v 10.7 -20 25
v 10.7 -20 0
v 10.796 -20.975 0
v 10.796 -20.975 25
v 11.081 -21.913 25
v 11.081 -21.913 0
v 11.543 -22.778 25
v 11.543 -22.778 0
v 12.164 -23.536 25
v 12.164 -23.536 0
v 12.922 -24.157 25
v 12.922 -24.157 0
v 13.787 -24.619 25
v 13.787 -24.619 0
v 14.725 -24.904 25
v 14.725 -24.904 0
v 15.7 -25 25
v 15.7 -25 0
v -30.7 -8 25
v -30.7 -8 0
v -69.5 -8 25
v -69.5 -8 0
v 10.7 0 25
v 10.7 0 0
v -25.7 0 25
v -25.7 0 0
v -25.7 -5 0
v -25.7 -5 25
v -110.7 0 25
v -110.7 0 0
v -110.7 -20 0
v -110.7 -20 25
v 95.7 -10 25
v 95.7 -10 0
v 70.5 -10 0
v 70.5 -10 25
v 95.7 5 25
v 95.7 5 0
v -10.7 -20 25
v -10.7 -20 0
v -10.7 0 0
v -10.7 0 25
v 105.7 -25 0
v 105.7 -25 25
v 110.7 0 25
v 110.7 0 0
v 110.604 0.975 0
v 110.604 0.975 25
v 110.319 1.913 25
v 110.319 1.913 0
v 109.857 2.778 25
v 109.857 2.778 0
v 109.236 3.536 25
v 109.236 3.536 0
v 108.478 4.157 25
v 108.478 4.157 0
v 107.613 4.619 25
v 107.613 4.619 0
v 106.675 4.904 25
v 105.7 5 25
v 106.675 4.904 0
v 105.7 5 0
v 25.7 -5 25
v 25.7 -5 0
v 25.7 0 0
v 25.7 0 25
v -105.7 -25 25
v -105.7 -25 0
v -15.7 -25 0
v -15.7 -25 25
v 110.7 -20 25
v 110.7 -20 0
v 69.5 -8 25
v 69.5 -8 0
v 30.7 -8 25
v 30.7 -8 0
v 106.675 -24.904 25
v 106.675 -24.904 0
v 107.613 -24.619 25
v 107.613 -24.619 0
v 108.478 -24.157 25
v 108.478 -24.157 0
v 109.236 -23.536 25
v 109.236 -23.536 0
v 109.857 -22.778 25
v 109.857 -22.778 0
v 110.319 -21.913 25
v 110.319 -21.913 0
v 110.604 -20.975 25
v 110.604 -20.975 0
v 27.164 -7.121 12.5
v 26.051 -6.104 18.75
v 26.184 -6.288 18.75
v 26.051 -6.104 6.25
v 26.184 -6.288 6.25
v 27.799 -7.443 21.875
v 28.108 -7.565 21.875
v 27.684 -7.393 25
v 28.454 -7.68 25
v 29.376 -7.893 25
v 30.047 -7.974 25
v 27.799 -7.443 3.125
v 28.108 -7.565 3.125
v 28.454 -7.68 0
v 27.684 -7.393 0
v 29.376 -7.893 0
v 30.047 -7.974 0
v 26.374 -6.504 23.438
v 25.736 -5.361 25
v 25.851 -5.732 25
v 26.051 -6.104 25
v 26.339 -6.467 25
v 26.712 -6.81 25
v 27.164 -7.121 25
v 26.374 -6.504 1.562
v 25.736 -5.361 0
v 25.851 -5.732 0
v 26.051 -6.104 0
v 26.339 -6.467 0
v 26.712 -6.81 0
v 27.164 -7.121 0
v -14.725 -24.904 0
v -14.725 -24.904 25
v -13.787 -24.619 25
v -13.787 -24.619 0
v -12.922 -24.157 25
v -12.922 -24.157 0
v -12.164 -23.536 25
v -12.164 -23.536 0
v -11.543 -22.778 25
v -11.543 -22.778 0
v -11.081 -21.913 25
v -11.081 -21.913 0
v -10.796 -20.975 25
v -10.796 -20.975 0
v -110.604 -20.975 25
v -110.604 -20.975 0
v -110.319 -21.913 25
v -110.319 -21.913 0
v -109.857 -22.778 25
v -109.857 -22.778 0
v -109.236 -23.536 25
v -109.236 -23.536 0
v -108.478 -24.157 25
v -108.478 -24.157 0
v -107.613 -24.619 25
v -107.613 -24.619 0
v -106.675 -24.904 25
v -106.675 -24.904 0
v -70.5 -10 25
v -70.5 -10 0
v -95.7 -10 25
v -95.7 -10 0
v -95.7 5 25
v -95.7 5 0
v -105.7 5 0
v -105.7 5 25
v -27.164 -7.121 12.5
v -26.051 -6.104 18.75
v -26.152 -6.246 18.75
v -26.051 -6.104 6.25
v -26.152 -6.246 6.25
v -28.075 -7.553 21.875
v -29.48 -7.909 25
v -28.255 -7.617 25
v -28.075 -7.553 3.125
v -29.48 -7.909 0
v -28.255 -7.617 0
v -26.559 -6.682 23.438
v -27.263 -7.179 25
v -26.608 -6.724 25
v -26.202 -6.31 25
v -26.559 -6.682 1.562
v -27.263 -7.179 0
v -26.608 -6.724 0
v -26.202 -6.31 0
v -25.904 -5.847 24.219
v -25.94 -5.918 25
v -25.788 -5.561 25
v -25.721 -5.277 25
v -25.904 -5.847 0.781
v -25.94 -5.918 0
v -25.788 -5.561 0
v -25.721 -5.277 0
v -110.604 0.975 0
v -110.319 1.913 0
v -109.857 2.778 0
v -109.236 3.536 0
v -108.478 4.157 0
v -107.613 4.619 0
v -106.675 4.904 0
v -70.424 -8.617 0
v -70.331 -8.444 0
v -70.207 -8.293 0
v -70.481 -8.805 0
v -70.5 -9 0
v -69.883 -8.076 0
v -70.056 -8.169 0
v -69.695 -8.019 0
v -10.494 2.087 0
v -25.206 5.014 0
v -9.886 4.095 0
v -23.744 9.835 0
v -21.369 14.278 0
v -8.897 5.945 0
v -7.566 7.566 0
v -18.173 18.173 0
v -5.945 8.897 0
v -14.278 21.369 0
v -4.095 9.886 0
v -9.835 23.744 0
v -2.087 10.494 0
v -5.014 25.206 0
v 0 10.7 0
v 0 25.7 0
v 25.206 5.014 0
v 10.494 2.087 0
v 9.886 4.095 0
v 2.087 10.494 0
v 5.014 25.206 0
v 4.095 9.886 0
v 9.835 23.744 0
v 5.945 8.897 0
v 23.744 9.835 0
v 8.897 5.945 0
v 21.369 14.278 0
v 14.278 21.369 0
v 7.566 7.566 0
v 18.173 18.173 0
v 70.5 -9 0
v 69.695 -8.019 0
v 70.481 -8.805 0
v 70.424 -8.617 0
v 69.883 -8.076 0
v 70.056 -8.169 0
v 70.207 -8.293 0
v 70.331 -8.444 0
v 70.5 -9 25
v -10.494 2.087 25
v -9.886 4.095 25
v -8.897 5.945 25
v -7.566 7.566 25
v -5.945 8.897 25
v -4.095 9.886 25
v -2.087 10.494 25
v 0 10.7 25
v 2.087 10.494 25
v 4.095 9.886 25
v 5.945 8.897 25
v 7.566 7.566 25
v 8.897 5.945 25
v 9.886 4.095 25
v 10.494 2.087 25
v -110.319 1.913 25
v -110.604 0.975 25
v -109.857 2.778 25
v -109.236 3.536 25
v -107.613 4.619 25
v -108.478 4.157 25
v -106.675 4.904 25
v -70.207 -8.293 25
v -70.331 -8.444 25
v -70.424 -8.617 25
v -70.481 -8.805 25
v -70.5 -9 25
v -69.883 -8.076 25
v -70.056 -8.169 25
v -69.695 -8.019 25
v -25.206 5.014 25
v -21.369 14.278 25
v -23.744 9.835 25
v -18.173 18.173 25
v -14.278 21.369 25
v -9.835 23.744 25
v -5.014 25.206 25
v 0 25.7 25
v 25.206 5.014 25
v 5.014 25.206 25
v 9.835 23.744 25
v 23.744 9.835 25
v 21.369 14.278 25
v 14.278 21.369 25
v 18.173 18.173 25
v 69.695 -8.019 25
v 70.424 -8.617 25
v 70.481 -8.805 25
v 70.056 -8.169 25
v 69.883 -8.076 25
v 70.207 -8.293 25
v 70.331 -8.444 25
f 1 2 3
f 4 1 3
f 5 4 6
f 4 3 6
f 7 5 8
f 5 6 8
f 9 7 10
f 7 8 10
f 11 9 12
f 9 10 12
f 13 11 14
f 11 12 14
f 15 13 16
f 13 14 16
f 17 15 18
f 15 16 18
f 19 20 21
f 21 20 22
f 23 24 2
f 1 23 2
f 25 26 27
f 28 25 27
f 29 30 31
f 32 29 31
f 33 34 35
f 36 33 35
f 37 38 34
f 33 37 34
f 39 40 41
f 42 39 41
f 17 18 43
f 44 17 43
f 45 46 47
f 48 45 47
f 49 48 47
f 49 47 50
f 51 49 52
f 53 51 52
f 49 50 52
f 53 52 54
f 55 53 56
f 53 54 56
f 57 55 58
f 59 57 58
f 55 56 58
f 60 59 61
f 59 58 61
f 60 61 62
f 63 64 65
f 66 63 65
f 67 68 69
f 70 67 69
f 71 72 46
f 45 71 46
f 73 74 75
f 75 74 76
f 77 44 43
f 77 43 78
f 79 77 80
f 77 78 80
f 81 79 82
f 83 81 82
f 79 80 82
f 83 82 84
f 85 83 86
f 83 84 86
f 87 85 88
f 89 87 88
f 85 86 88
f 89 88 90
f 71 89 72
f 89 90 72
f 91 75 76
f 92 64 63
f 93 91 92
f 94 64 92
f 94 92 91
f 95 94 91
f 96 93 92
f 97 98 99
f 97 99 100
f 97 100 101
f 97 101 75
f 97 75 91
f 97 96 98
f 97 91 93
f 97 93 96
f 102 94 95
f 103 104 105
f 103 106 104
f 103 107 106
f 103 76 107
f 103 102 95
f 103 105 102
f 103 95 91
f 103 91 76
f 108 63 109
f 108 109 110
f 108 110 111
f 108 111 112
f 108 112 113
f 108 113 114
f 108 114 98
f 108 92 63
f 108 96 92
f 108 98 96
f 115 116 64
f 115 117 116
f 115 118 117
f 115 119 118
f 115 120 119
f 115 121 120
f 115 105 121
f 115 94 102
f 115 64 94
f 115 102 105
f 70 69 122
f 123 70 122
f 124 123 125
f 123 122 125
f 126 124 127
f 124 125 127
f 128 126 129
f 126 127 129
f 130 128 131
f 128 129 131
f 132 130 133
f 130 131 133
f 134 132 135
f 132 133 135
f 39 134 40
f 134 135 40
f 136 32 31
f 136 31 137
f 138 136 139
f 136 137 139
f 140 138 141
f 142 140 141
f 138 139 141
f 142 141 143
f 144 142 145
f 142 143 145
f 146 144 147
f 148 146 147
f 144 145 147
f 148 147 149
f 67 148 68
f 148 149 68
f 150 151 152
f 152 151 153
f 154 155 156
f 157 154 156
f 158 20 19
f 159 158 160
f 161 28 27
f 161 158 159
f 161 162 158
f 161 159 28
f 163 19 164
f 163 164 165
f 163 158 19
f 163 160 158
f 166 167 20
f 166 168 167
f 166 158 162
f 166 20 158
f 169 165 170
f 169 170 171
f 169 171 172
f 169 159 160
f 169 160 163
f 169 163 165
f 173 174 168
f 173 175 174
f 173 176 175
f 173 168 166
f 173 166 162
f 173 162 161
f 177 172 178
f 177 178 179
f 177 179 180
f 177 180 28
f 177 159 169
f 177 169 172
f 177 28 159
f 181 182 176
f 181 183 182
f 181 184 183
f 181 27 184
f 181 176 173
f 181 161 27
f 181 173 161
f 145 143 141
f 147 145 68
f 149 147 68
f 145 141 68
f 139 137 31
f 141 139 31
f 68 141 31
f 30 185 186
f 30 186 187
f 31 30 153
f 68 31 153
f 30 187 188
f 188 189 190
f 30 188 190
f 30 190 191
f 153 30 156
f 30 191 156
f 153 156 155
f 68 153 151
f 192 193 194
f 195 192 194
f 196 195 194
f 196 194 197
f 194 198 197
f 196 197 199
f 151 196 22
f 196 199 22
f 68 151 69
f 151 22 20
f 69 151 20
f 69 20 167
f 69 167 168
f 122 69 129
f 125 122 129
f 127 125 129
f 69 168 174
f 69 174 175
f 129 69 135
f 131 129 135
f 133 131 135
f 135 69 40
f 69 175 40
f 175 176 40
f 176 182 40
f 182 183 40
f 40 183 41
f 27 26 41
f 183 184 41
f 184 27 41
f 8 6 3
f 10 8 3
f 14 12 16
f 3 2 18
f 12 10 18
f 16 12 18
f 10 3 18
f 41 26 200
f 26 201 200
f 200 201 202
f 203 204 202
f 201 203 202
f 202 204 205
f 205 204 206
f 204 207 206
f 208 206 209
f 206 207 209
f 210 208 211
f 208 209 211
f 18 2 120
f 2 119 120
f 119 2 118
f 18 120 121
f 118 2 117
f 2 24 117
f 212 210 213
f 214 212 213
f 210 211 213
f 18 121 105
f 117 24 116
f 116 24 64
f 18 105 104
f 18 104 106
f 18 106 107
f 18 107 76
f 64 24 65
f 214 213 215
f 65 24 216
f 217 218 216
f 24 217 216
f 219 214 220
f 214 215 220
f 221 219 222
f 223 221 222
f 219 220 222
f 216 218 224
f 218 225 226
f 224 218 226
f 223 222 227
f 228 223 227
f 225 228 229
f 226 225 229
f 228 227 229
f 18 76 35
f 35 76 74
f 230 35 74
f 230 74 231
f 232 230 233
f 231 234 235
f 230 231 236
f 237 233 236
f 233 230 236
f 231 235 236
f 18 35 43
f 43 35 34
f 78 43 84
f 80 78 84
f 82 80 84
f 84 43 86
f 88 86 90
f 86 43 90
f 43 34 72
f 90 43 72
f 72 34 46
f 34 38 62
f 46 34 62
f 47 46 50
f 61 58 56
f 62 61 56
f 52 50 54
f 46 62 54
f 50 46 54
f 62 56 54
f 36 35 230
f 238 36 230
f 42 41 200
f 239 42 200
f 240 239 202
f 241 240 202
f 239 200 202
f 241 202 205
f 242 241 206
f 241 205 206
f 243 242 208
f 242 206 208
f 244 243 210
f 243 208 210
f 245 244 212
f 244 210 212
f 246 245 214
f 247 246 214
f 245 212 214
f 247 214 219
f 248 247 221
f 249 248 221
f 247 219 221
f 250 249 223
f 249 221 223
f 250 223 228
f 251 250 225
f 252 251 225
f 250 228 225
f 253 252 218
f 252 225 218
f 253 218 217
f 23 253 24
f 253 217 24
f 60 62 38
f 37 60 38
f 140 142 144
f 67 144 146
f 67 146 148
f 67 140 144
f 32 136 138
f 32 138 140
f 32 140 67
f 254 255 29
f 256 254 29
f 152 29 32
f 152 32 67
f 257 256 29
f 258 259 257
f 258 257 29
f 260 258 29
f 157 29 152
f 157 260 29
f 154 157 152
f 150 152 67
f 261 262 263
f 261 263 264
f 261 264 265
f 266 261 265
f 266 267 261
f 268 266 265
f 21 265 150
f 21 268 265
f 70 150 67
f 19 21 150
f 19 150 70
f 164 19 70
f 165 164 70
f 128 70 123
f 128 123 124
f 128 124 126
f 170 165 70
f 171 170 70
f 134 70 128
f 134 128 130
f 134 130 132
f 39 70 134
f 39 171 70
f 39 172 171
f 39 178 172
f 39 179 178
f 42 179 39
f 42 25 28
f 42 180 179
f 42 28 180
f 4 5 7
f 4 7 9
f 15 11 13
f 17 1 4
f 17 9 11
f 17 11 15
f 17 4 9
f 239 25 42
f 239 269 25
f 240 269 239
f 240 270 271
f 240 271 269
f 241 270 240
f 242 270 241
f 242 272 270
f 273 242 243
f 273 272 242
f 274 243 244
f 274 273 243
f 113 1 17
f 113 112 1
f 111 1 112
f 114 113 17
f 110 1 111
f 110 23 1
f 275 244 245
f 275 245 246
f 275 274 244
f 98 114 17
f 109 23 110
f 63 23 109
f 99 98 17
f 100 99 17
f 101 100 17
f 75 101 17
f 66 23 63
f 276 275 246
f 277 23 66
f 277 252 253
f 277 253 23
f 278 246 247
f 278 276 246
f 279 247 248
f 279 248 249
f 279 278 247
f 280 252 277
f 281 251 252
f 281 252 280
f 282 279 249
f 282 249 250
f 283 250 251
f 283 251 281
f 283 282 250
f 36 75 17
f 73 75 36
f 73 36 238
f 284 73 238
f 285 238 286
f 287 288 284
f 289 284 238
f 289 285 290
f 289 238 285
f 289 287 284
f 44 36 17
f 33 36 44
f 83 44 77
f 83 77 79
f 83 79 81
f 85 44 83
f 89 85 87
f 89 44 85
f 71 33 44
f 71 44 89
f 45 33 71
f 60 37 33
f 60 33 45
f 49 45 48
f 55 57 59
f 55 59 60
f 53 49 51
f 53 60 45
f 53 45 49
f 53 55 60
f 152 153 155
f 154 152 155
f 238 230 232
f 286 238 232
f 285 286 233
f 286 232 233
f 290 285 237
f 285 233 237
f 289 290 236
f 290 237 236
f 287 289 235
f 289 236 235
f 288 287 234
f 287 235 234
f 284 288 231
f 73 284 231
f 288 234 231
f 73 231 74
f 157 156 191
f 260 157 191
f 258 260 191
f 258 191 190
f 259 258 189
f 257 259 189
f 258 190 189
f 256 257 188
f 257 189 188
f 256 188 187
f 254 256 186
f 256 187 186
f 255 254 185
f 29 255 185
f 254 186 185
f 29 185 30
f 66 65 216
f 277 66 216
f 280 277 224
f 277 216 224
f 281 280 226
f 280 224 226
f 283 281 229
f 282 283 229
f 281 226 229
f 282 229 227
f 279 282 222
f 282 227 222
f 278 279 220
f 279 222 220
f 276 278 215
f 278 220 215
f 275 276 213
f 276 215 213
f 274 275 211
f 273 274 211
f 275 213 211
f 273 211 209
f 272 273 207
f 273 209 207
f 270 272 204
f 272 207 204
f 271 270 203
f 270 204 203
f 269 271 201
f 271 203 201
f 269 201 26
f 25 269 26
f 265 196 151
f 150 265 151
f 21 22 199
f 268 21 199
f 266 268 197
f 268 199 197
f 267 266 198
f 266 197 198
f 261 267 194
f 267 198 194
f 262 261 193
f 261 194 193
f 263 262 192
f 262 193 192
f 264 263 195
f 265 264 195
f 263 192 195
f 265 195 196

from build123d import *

# Parameters (mm, degrees)
F1_DEPTH = 25


with BuildPart() as f1:
    # F0 (on Top) → F1 (new body)
    with BuildSketch(Plane.XY):
        with BuildLine():
            ThreePointArc((-10.7, 0), (0, 10.7), (10.7, 0))
            Line((10.7, 0), (10.7, -20))
            ThreePointArc((10.7, -20), (12.1644660941, -23.5355339059), (15.7, -25))
            Line((15.7, -25), (105.7, -25))
            ThreePointArc((105.7, -25), (109.2355339059, -23.5355339059), (110.7, -20))
            Line((110.7, -20), (110.7, -10))
            Line((110.7, -10), (110.7, 0))
            ThreePointArc((110.7, 0), (109.2355339059, 3.5355339059), (105.7, 5))
            Line((105.7, 5), (95.7, 5))
            Line((95.7, 5), (95.7, -10))
            Line((95.7, -10), (70.5, -10))
            Line((70.5, -10), (70.5, -9))
            ThreePointArc((70.5, -9), (70.2071067812, -8.2928932188), (69.5, -8))
            Line((69.5, -8), (30.7, -8))
            add(Edge.make_bspline(
                [(25.7, -5), (25.7, -8), (30.7, -8)],
                knots=[0, 0, 0, 1.5707963268, 1.5707963268, 1.5707963268], degree=2, weights=[1, 0.7071067812, 1]))
            Line((25.7, -5), (25.7, 0))
            ThreePointArc((25.7, 0), (0, 25.7), (-25.7, 0))
            Line((-25.7, 0), (-25.7, -5))
            add(Edge.make_bspline(
                [(-30.7, -8), (-25.7, -8), (-25.7, -5)],
                knots=[4.7123889804, 4.7123889804, 4.7123889804, 6.2831853072, 6.2831853072, 6.2831853072], degree=2, weights=[1, 0.7071067812, 1]))
            Line((-30.7, -8), (-69.5, -8))
            ThreePointArc((-69.5, -8), (-70.2071067812, -8.2928932188), (-70.5, -9))
            Line((-70.5, -9), (-70.5, -10))
            Line((-70.5, -10), (-95.7, -10))
            Line((-95.7, -10), (-95.7, 5))
            Line((-95.7, 5), (-105.7, 5))
            ThreePointArc((-105.7, 5), (-109.2355339059, 3.5355339059), (-110.7, 0))
            Line((-110.7, 0), (-110.7, -10))
            Line((-110.7, -10), (-110.7, -20))
            ThreePointArc((-110.7, -20), (-109.2355339059, -23.5355339059), (-105.7, -25))
            Line((-105.7, -25), (-15.7, -25))
            ThreePointArc((-15.7, -25), (-12.1644660941, -23.5355339059), (-10.7, -20))
            Line((-10.7, -20), (-10.7, 0))
        make_face()
    extrude(amount=F1_DEPTH)


solid = f1.part
